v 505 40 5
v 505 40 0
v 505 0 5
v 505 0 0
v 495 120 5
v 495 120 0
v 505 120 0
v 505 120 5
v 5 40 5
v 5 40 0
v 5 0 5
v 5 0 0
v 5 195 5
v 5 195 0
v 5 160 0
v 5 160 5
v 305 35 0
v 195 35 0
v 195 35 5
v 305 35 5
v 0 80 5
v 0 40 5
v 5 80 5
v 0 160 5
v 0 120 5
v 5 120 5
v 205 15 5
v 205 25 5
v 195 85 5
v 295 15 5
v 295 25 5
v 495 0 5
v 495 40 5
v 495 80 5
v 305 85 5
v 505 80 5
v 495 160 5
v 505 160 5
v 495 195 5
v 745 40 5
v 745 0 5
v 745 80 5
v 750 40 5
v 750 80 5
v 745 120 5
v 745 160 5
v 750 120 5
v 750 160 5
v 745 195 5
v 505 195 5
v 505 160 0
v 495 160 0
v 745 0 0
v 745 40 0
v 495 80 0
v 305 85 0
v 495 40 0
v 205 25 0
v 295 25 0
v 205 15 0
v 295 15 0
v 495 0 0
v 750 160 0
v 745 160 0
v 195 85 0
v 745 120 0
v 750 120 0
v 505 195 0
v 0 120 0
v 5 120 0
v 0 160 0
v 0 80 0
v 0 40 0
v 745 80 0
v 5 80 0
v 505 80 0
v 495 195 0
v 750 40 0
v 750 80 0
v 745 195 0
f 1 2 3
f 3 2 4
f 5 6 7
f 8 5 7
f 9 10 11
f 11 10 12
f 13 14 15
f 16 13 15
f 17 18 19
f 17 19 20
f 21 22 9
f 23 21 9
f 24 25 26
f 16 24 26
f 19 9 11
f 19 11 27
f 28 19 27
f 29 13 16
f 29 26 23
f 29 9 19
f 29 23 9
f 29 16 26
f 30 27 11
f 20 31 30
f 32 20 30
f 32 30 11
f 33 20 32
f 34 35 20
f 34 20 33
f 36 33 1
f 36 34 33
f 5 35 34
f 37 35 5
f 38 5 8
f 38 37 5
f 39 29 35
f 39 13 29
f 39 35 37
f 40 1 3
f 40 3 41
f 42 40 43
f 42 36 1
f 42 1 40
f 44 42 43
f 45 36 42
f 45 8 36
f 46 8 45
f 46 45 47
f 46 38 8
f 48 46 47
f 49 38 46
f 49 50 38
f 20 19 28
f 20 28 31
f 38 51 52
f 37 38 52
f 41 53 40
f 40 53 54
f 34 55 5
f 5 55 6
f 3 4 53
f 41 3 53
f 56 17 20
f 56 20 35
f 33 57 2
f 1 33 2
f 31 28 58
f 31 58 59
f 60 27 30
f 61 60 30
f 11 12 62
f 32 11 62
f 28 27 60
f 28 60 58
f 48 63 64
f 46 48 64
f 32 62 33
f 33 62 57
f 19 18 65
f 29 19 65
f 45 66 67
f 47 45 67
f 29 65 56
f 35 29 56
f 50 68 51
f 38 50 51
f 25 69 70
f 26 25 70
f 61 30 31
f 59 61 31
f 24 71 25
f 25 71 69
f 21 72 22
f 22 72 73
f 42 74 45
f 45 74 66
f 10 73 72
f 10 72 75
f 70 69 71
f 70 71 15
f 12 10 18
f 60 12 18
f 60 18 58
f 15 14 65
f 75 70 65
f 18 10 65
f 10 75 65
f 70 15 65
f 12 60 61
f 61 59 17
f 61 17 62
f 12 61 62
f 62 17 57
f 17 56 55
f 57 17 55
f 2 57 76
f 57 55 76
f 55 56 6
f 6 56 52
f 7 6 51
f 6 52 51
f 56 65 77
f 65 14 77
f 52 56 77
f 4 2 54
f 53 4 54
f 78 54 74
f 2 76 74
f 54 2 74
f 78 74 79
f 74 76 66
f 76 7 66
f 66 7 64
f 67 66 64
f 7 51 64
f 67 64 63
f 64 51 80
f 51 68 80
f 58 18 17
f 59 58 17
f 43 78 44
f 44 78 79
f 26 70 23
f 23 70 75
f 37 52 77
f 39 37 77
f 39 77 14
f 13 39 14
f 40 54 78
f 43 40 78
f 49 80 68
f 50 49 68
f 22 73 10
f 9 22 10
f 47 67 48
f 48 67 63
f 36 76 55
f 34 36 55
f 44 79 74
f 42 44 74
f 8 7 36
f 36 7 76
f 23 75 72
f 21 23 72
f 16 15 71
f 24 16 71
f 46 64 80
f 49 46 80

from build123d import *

# Parameters (mm, degrees)
ESQUISSE1_W             = 110
ESQUISSE1_H             = 50
BOSS_EXTRU_1_DEPTH      = 5
ENL_V_MAT_EXTRU_1_REACH = 776.952
ESQUISSE2_W             = 90
ESQUISSE2_H             = 10


with BuildPart() as part:
    # Esquisse1 → Boss.-Extru.1 (new body)
    # profile 1 of 2: a face of its own
    with BuildSketch(Plane.XY):
        Polygon((745, 120), (750, 120), (750, 160), (745, 160), (745, 195), (505, 195), (505, 160), (500, 160), (500, 120), (505, 120), (505, 80), (500, 80), (500, 40), (505, 40), (505, 0), (745, 0), (745, 40), (750, 40), (750, 80), (745, 80), align=None)
    # profile 2 of 2: a face of its own
    with BuildSketch(Plane.XY):
        Polygon((500, 120), (500, 160), (495, 160), (495, 195), (5, 195), (5, 160), (0, 160), (0, 120), (5, 120), (5, 80), (0, 80), (0, 40), (5, 40), (5, 0), (495, 0), (495, 40), (500, 40), (500, 80), (495, 80), (495, 120), align=None)
        with Locations((250, 60)):
            Rectangle(ESQUISSE1_W, ESQUISSE1_H, mode=Mode.SUBTRACT)
    extrude(amount=BOSS_EXTRU_1_DEPTH)

    # Esquisse2 → Enlèv. mat.-Extru.1 (cut, up to next)
    with BuildSketch(Plane.XY.offset(5), mode=Mode.PRIVATE) as enl_v_mat_extru_1_sk1:
        with Locations((250, 20)):
            Rectangle(ESQUISSE2_W, ESQUISSE2_H)
    enl_v_mat_extru_1_tool1 = extrude(enl_v_mat_extru_1_sk1.sketch, amount=-ENL_V_MAT_EXTRU_1_REACH, mode=Mode.PRIVATE) & part.part
    add(enl_v_mat_extru_1_tool1.solids().sort_by_distance((250, 20, 5))[0], mode=Mode.SUBTRACT)


solid = part.part
